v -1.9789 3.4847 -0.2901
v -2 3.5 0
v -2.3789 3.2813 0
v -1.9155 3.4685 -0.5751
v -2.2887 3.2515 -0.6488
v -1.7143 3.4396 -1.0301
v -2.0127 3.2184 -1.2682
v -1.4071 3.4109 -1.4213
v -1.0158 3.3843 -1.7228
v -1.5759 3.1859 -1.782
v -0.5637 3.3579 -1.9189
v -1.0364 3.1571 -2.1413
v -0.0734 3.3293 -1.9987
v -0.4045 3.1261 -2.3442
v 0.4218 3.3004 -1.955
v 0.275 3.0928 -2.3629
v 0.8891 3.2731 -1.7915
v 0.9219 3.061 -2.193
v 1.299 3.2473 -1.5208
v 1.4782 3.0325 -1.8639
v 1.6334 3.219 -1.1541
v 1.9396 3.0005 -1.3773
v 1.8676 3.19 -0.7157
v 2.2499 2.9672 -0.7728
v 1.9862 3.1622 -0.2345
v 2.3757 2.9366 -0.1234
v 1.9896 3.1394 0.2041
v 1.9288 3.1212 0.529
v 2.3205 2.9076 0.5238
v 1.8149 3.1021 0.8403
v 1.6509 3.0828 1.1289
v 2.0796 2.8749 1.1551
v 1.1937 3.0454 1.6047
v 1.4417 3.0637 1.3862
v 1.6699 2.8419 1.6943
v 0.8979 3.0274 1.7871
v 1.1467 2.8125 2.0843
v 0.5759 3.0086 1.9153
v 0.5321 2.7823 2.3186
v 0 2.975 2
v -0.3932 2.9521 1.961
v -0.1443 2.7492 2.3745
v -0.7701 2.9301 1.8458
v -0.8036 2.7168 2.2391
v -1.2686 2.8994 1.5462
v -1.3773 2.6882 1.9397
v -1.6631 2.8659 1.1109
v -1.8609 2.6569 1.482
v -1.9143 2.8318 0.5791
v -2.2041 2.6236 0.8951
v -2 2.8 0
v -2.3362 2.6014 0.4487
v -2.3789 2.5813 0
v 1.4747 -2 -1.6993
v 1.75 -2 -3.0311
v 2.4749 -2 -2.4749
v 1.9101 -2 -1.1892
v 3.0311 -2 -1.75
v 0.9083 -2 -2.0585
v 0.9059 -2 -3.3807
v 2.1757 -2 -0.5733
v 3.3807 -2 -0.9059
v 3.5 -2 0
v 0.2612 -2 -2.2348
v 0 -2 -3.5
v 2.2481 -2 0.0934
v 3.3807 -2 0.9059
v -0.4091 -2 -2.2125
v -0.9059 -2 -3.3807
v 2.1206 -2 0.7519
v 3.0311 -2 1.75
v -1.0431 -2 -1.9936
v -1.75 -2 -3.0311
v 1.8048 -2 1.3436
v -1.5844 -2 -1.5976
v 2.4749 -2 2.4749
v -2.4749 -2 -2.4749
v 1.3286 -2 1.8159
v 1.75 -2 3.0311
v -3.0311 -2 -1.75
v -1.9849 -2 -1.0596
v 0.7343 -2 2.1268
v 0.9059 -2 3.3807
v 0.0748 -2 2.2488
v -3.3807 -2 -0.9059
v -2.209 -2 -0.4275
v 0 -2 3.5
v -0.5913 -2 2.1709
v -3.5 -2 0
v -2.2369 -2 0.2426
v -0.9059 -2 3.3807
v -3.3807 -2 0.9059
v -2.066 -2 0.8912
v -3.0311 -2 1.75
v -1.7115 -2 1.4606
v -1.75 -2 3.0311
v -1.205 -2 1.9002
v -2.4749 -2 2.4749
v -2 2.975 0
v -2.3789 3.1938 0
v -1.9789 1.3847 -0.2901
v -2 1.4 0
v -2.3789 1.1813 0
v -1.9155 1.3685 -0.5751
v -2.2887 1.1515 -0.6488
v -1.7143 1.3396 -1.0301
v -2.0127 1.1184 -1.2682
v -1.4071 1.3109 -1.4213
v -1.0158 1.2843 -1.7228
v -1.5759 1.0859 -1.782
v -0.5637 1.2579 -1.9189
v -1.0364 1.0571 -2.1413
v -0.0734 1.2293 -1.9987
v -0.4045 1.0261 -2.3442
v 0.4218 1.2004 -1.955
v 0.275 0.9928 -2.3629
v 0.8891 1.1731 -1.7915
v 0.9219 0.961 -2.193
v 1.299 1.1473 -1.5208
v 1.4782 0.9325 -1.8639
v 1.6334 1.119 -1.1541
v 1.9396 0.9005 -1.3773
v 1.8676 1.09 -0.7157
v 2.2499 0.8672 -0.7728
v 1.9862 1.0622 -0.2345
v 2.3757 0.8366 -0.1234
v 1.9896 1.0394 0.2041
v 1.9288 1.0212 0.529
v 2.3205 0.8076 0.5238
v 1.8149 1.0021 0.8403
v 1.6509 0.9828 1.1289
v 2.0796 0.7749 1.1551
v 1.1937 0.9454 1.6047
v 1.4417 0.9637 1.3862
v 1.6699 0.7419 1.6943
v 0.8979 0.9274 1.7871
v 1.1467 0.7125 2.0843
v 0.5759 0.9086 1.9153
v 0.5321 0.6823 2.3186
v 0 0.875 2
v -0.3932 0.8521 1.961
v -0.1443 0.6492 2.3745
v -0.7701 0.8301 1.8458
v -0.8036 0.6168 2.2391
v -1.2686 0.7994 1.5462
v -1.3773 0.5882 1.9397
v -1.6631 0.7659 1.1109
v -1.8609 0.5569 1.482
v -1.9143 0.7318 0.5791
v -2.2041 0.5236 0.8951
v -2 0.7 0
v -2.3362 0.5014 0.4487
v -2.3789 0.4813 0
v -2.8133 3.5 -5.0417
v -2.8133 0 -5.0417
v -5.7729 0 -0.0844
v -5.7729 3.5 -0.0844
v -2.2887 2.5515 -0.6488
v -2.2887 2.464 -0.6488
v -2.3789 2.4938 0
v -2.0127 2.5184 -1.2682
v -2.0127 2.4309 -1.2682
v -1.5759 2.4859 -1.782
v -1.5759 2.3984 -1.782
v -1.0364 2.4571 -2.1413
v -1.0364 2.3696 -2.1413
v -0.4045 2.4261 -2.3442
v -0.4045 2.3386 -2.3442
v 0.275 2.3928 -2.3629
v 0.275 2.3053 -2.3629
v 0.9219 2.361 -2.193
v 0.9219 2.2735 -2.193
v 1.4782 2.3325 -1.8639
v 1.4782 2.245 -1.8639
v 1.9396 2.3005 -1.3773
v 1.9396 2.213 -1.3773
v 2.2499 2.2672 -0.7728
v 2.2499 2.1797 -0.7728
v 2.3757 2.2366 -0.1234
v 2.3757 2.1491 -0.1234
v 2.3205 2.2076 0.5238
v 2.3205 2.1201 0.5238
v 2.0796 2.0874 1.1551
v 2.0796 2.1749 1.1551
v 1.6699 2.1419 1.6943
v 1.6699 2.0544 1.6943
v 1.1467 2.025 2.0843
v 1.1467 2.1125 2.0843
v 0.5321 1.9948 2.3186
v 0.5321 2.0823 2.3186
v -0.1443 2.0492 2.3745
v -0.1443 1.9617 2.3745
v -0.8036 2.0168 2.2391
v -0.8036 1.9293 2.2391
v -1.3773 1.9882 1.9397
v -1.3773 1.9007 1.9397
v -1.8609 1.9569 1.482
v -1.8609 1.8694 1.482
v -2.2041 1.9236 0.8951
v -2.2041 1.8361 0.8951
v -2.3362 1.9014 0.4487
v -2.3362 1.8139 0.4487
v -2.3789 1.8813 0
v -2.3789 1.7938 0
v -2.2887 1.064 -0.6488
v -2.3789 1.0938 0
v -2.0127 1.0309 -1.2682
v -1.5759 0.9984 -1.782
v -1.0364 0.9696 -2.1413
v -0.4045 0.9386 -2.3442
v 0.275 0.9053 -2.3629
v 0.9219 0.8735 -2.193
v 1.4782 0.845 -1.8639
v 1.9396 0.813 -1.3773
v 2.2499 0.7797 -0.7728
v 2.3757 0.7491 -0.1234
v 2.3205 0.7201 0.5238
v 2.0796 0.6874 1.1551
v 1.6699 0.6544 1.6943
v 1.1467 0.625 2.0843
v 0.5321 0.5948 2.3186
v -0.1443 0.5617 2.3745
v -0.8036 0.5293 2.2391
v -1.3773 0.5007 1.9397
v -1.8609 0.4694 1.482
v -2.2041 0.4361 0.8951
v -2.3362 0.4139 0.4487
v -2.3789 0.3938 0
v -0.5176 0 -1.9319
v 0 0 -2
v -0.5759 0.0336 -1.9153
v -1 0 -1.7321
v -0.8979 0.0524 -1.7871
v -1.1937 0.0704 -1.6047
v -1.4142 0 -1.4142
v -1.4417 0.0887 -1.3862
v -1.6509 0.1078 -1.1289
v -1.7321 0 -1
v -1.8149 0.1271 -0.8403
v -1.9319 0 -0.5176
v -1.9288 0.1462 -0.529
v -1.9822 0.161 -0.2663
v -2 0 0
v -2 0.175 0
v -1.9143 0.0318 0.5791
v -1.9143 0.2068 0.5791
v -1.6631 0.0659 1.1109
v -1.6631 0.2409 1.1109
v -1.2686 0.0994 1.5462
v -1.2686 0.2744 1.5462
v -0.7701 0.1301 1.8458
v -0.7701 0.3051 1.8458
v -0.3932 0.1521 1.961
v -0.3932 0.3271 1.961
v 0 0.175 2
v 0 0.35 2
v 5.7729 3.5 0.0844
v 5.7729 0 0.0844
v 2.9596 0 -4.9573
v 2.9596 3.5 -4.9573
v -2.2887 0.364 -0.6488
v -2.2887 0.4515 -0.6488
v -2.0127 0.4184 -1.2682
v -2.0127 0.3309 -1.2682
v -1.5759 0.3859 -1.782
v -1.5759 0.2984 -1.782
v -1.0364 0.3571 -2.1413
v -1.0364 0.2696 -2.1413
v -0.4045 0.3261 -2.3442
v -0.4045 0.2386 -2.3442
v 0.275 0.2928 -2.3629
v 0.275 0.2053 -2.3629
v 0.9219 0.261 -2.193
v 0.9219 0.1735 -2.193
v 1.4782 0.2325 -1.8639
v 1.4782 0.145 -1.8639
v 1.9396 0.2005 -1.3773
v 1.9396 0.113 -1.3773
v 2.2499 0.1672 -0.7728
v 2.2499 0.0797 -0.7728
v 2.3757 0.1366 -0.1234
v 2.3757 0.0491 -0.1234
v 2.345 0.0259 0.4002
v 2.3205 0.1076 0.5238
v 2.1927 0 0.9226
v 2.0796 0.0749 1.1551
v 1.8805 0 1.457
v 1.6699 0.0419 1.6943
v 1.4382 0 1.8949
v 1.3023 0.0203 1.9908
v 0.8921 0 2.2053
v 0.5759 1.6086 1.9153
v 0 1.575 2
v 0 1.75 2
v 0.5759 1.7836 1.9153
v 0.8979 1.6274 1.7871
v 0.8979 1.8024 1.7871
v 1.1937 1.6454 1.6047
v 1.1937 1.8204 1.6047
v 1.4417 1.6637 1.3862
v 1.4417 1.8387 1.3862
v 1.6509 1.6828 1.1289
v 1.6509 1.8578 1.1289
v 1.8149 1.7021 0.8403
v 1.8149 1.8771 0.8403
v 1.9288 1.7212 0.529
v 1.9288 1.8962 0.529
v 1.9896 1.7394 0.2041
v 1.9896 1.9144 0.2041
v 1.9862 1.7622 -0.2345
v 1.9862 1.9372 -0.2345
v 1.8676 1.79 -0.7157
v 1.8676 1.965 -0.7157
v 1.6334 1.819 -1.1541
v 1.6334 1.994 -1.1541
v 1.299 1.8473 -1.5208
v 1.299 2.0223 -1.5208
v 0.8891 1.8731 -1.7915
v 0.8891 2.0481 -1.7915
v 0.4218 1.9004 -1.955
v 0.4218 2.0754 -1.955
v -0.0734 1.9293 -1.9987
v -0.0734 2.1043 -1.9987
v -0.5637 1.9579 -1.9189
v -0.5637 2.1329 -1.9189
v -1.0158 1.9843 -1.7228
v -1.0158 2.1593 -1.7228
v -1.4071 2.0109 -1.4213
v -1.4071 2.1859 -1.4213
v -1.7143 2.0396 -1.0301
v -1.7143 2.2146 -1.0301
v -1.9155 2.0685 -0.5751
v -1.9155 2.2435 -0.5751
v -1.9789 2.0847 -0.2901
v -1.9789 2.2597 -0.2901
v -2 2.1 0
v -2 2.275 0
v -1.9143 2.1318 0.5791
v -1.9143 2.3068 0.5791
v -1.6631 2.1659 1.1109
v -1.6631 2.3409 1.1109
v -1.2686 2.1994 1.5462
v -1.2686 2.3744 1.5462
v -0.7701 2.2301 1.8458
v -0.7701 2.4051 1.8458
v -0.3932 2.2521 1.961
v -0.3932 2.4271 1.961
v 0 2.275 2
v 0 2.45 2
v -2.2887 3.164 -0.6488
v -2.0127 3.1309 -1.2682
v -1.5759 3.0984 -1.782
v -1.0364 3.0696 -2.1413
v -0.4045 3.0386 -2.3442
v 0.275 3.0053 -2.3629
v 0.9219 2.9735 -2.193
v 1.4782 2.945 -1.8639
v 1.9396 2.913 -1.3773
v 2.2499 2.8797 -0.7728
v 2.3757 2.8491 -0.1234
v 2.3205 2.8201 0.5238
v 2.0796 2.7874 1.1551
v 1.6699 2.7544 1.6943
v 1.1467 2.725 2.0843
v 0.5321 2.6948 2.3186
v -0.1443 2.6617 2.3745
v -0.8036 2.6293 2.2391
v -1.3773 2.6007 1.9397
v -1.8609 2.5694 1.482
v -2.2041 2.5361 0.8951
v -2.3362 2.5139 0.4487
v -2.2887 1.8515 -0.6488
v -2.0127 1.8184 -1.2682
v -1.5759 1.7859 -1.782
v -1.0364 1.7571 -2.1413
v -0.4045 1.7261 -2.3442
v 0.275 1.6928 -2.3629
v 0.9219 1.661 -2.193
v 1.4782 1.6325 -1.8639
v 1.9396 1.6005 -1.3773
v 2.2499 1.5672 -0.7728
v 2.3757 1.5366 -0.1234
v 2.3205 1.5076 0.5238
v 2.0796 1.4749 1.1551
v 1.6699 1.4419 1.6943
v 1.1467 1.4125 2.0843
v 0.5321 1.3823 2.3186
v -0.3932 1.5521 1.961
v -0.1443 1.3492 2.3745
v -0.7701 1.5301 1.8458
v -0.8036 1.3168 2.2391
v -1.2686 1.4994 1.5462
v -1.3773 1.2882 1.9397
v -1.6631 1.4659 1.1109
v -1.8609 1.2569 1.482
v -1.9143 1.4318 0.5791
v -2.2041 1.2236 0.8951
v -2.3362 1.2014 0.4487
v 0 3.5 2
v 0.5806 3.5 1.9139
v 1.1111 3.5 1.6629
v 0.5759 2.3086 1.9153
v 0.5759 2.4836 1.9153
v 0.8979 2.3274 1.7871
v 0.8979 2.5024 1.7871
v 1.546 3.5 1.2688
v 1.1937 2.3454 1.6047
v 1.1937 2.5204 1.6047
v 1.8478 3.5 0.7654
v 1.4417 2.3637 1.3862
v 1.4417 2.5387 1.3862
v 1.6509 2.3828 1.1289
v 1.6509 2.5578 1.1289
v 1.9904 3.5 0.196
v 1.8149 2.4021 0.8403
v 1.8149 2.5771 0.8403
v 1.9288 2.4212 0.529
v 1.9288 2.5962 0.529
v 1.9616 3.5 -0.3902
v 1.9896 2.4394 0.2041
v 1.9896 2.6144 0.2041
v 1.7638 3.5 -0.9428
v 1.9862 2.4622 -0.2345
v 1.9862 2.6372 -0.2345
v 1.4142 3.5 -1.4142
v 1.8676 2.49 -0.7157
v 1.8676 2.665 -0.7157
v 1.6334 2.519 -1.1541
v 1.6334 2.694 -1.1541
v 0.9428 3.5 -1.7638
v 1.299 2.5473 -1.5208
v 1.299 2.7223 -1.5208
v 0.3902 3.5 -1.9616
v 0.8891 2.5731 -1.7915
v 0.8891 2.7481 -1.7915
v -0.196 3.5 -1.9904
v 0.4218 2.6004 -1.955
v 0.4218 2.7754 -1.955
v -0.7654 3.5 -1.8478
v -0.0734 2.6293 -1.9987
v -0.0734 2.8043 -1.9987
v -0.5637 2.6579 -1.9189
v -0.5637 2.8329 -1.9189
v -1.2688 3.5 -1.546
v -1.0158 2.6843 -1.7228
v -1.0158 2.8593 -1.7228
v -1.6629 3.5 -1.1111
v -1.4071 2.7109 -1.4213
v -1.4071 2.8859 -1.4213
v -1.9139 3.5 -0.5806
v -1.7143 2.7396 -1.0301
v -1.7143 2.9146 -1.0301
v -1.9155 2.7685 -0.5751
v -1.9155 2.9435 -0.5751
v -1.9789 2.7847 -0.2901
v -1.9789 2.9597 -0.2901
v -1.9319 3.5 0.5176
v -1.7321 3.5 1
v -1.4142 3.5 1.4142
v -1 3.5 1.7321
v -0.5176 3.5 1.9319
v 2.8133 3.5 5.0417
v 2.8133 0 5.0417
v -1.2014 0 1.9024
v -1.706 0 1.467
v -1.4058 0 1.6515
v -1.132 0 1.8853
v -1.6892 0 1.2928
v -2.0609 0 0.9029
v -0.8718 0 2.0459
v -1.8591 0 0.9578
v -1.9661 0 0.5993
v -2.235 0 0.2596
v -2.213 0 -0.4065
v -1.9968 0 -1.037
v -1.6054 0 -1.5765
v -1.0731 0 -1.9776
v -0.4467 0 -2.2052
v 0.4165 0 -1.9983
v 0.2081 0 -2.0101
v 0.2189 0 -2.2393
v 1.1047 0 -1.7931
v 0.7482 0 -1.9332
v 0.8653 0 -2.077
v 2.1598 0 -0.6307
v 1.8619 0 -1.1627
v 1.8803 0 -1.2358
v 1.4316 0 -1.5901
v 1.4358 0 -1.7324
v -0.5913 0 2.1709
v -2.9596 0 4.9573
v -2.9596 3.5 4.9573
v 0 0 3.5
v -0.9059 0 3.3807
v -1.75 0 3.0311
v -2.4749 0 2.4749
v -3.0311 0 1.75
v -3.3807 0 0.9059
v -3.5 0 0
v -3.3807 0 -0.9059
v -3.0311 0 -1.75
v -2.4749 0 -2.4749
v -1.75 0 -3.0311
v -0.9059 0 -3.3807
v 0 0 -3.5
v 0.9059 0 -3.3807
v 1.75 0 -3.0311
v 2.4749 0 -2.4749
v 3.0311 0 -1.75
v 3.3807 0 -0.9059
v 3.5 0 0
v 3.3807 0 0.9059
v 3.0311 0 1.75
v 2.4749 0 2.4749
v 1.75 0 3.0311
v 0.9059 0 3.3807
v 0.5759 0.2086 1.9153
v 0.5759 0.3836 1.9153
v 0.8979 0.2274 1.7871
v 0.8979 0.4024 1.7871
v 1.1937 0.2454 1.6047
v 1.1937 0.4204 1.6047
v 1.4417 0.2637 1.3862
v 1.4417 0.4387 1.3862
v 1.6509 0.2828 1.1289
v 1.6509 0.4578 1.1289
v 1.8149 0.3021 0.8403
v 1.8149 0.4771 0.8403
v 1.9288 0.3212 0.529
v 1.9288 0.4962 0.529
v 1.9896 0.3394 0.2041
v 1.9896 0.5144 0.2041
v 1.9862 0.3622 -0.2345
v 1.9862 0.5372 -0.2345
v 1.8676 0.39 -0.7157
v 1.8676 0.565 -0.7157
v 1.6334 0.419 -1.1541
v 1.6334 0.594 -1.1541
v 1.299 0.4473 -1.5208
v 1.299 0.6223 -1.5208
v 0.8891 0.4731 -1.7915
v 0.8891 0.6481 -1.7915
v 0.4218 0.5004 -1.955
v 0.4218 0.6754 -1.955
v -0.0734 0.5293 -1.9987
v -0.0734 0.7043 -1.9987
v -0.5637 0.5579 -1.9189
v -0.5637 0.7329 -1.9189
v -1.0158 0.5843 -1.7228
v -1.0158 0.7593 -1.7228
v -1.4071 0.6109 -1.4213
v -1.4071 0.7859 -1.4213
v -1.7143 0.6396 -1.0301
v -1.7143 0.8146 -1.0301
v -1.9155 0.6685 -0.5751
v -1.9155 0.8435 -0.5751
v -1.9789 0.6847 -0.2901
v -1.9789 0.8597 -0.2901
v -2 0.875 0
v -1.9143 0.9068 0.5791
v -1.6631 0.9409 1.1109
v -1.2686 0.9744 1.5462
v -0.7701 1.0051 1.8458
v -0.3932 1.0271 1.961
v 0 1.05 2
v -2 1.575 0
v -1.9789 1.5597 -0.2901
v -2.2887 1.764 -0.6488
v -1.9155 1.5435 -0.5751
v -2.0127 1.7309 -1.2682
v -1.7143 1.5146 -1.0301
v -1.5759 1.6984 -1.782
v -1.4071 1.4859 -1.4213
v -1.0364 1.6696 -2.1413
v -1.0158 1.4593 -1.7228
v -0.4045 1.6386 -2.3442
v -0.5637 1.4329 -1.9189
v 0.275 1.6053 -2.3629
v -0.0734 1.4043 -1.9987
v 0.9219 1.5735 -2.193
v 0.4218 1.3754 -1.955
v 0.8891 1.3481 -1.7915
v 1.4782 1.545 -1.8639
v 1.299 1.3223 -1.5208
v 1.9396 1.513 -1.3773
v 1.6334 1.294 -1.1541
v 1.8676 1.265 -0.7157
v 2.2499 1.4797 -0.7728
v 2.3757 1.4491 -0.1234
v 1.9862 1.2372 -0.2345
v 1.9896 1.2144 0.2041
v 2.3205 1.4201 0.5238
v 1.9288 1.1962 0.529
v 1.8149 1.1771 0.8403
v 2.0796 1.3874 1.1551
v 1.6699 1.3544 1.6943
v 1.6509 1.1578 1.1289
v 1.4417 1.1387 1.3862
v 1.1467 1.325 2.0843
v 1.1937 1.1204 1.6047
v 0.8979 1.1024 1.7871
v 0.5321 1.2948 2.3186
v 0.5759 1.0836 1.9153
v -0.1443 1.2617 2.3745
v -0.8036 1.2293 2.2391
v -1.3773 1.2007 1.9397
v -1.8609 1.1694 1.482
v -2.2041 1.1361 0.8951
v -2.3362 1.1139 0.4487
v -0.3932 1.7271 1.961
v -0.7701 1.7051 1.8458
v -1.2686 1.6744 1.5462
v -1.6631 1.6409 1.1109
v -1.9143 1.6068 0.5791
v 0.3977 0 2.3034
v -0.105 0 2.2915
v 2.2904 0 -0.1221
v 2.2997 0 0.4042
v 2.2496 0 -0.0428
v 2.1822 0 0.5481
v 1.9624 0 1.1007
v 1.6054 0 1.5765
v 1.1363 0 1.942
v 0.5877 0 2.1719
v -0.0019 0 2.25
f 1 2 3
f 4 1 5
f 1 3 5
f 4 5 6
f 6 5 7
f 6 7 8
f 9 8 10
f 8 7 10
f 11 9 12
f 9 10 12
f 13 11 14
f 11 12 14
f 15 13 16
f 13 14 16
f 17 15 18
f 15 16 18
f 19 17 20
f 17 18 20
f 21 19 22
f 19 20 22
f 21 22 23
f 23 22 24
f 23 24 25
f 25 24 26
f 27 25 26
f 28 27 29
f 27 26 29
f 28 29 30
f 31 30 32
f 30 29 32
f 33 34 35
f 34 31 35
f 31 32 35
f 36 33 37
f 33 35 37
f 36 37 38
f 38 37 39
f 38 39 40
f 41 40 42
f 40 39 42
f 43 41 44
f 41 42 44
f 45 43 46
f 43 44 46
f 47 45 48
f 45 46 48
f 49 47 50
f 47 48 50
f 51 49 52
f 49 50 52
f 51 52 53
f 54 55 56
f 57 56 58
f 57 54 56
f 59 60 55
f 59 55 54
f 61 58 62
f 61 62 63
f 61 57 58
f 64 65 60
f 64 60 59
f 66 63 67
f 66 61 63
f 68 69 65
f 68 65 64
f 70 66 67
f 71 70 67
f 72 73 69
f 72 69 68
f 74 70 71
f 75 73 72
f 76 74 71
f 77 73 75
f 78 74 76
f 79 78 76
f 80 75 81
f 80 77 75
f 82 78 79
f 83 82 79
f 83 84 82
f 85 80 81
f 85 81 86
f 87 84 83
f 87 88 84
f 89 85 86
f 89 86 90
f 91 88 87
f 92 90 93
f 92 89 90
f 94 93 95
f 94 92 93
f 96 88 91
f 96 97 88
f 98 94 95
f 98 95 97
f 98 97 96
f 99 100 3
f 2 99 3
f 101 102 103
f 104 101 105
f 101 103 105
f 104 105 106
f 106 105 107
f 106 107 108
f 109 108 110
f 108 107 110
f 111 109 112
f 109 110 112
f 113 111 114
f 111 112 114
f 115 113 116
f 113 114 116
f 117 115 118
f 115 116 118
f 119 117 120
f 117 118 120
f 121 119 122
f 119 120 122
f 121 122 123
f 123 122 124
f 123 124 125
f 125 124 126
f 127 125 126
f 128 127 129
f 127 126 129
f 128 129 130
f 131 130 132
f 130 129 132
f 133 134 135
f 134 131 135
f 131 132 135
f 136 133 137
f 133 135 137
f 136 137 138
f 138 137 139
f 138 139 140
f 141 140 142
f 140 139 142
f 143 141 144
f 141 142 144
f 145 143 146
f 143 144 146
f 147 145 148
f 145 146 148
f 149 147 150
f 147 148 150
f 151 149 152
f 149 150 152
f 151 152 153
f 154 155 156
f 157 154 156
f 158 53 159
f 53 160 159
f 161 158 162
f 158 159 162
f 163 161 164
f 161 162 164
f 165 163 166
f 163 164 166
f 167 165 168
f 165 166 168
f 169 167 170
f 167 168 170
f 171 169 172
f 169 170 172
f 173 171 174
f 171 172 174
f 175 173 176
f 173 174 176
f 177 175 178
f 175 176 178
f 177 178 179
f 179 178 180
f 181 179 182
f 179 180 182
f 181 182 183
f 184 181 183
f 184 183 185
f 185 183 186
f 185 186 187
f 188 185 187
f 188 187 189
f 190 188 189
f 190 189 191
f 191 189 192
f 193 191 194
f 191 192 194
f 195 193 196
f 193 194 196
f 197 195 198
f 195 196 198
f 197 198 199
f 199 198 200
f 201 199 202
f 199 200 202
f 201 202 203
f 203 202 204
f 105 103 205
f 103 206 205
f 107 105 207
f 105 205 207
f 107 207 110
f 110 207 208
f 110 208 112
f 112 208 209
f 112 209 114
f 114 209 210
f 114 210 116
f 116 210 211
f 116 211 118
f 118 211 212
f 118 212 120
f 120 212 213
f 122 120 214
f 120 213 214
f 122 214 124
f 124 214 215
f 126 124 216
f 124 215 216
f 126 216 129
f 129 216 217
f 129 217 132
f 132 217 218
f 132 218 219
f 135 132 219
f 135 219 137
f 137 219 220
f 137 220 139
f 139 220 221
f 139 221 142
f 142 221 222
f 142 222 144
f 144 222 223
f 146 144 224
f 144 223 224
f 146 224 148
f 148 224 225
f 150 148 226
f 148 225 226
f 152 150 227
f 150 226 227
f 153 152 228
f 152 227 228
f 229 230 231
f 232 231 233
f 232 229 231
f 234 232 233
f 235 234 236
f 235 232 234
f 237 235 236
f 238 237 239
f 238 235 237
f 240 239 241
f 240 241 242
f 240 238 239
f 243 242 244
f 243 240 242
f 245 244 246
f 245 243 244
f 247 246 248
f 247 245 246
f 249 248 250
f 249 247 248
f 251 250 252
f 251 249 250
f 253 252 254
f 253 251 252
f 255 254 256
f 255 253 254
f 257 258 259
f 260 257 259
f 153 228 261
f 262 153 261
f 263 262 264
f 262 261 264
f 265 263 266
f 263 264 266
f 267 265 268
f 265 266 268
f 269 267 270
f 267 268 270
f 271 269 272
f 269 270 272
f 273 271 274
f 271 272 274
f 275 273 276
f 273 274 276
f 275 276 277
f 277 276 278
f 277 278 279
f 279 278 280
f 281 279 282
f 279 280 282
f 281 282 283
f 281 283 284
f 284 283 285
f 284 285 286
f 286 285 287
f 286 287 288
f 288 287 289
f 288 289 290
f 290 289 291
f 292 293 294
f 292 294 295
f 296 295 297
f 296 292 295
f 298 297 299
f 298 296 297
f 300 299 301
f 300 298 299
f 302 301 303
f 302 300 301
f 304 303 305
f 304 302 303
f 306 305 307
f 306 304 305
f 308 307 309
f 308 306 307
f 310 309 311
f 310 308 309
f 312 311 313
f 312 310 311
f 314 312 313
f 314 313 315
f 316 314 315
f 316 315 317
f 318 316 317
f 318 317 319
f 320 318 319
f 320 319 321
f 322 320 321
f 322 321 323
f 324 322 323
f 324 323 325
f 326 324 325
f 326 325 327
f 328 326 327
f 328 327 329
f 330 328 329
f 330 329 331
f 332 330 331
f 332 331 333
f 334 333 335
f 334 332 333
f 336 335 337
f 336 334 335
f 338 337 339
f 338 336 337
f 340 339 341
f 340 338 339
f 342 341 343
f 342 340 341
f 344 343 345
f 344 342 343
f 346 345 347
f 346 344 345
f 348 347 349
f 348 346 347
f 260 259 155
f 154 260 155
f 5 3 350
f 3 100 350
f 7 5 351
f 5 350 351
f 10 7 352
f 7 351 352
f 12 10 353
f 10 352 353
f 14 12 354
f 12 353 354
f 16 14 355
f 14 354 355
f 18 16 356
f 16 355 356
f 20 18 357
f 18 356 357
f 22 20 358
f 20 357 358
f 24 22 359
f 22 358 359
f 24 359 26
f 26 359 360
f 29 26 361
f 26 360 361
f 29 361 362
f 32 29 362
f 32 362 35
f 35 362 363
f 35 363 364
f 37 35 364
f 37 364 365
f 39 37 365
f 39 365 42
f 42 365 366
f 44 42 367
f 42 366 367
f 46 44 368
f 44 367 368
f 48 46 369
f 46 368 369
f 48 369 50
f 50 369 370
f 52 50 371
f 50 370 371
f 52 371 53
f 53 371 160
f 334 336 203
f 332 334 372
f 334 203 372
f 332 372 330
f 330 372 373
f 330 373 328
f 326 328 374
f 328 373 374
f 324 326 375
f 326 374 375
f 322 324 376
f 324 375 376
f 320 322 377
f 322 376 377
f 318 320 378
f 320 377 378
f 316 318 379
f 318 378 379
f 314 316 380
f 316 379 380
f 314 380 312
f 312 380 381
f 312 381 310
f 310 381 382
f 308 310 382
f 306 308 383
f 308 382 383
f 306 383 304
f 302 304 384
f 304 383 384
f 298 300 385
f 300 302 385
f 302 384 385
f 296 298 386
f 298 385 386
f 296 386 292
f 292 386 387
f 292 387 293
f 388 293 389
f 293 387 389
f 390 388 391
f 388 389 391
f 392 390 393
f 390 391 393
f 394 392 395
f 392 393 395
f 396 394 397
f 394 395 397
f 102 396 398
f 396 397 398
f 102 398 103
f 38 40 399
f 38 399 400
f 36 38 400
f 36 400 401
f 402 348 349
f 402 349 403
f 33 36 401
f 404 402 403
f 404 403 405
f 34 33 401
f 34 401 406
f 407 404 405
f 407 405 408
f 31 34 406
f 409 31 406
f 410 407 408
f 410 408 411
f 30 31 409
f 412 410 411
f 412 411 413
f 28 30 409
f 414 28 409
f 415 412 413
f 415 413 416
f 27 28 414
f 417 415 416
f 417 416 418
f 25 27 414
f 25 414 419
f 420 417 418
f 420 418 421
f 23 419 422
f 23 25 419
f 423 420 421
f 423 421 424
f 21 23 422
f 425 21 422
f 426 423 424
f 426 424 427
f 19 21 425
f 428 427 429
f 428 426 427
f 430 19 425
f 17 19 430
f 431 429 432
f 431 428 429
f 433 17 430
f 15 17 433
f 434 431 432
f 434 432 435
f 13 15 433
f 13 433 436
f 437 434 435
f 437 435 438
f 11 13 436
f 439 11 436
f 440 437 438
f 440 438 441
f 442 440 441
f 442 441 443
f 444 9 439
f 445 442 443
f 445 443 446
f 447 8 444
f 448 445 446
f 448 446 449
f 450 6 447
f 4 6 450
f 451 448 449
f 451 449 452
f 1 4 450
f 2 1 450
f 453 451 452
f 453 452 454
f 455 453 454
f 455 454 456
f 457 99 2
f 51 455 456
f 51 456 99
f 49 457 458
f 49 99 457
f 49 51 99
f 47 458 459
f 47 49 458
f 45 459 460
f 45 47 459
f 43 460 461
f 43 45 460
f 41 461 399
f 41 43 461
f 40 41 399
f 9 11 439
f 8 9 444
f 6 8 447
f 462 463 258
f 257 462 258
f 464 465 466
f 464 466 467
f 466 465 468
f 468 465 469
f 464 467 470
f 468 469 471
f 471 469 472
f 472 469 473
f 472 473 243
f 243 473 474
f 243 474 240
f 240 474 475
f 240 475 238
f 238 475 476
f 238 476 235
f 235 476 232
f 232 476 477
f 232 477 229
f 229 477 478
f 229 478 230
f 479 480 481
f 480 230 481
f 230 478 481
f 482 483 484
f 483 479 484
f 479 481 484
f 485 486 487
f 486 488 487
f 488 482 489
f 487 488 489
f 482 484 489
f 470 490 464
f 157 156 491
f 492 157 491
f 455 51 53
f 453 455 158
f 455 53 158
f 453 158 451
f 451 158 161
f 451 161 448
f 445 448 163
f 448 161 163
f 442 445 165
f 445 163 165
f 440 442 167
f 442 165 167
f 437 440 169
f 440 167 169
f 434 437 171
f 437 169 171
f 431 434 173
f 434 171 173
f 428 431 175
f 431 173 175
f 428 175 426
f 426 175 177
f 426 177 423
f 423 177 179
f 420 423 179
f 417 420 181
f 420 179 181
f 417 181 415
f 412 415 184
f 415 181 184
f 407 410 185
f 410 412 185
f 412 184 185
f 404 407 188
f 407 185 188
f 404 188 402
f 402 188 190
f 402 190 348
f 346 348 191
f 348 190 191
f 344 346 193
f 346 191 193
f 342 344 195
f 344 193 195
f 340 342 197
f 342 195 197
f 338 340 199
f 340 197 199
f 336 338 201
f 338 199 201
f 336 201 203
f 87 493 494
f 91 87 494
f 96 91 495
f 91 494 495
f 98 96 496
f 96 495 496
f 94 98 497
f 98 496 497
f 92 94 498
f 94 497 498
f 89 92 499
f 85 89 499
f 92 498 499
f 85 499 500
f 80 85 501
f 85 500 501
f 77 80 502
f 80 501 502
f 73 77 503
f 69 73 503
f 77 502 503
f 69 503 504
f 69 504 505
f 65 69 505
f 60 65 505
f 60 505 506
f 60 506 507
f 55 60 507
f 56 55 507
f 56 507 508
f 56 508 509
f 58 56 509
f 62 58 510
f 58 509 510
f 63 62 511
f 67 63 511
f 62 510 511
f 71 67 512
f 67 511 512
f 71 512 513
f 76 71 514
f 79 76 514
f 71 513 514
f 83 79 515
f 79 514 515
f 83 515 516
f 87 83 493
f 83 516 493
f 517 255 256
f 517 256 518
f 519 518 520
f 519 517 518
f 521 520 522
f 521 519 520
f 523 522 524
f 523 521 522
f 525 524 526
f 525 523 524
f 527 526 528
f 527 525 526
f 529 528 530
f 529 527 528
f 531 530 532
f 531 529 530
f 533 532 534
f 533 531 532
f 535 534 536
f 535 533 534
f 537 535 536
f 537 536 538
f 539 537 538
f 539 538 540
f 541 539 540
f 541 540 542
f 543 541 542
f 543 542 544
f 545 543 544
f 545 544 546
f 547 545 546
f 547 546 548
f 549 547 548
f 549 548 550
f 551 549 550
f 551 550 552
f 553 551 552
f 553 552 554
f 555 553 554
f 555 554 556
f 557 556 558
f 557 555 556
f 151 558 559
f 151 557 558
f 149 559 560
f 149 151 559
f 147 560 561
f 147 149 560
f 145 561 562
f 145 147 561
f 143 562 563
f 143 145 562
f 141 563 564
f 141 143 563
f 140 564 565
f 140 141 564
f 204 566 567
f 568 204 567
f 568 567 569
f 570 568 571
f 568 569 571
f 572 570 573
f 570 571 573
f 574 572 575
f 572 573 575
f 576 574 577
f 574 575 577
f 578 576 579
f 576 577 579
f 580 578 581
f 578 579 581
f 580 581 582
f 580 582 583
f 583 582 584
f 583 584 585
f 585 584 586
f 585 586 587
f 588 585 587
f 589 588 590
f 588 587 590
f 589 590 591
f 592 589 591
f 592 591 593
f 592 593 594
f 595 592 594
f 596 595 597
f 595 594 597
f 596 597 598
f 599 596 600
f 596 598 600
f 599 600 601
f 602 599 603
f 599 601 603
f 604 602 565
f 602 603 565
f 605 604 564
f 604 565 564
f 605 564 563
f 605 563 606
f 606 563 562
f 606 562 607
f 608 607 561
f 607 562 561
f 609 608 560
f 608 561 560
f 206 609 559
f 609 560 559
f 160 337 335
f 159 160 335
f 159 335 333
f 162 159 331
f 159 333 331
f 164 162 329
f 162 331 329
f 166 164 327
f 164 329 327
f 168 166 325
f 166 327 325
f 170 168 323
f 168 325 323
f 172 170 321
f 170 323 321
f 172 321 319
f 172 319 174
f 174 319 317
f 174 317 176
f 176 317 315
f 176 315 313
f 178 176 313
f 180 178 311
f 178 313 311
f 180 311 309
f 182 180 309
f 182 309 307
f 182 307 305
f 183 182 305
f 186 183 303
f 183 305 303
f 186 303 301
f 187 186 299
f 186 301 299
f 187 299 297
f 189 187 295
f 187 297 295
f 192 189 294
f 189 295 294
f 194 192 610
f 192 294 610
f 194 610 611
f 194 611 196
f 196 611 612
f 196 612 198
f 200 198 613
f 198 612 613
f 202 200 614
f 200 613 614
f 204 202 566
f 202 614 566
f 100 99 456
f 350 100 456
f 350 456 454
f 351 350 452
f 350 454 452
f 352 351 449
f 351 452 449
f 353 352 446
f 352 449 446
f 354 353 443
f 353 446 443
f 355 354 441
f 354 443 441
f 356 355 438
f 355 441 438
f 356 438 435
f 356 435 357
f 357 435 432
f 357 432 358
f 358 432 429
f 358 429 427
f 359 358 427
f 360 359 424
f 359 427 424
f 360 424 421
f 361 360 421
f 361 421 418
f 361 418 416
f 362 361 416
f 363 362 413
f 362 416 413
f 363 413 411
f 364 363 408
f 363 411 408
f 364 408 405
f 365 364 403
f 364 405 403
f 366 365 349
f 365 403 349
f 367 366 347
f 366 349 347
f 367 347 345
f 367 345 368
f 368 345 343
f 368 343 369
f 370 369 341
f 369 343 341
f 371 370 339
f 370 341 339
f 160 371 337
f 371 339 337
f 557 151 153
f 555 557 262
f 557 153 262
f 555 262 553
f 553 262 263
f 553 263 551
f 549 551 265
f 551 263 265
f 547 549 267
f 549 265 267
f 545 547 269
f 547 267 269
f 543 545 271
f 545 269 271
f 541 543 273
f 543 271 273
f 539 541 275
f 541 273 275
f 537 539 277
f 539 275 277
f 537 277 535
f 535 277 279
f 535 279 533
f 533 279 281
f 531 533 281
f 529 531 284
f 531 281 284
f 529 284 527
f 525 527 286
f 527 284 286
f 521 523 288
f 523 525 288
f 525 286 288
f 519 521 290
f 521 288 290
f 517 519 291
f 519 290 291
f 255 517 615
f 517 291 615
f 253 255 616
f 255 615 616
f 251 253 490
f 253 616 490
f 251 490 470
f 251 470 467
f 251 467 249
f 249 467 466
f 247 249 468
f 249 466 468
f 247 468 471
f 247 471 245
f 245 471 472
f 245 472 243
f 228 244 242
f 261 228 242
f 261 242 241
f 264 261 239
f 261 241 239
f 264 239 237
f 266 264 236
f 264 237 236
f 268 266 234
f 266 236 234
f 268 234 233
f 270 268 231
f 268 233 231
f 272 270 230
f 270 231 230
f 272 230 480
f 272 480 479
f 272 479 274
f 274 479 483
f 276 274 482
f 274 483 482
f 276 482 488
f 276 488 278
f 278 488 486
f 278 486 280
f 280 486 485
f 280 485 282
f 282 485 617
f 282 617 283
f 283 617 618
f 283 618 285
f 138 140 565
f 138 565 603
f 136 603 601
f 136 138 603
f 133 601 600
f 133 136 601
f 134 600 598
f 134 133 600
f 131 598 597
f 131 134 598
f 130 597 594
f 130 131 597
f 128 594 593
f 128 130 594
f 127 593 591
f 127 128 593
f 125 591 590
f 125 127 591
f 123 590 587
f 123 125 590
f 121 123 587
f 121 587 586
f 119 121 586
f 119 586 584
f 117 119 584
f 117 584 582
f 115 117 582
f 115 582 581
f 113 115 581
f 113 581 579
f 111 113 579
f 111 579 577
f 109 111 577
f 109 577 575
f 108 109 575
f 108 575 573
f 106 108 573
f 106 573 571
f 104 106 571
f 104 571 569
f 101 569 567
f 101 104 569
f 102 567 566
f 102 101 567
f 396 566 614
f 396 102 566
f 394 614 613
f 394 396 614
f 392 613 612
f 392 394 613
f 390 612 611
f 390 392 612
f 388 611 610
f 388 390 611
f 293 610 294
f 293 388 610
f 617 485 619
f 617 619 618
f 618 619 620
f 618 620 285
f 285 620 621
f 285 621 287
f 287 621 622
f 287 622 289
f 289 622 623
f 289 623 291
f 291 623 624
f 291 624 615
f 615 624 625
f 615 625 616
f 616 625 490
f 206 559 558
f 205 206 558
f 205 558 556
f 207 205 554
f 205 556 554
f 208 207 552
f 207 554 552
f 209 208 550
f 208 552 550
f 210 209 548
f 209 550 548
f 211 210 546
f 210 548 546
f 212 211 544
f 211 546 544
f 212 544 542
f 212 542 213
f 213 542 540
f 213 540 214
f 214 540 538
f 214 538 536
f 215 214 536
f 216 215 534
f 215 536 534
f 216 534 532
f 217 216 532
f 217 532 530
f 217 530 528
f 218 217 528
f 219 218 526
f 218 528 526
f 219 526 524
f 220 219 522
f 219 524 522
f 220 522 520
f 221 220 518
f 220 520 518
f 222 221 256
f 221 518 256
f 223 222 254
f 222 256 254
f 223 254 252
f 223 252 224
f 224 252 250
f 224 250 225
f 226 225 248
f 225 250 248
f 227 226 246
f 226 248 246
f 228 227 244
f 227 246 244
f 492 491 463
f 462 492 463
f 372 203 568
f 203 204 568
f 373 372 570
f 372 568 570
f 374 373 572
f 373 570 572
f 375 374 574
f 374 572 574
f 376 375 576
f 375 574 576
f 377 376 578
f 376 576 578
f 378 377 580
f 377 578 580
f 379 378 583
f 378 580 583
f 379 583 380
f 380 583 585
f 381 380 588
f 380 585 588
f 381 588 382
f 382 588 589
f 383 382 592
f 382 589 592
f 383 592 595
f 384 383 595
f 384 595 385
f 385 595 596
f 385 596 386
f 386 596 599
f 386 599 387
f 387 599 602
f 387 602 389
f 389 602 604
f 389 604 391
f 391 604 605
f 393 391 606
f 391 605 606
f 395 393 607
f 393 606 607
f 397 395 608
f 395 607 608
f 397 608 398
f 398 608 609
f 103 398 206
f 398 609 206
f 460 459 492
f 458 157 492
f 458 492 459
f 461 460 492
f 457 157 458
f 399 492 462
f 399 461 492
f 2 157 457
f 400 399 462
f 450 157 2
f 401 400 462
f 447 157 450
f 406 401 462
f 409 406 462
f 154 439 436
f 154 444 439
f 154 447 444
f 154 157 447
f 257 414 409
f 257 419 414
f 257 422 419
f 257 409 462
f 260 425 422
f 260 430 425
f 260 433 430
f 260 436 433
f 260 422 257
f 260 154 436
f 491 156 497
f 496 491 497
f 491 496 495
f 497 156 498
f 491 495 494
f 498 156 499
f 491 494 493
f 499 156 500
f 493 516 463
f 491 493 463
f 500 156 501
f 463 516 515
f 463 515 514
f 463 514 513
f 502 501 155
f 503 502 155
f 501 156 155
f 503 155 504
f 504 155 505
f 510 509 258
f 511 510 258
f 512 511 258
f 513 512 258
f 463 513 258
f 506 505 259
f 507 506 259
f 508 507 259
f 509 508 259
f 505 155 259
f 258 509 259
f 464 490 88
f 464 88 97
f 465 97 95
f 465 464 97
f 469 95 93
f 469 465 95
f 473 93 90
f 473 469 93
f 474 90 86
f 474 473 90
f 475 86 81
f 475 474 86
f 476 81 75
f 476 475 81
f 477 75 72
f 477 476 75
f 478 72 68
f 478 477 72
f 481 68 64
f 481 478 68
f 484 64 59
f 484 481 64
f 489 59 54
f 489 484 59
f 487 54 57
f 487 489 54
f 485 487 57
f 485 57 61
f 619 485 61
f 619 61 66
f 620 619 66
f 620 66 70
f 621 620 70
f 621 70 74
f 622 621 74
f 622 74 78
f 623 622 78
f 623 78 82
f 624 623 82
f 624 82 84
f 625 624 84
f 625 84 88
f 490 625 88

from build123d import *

# Parameters (mm, degrees)
CROQUIS1_R              = 2
SALIENTE_EXTRUIR1_DEPTH = 3.5
ROSCA1_PITCH            = 0.7
CROQUIS2_R              = 3.5
CROQUIS2_R_2            = 2.25
SALIENTE_EXTRUIR2_DEPTH = 2


with BuildPart() as part:
    # Croquis1 → Saliente-Extruir1 (new body)
    with BuildSketch(Plane(origin=(0, 0, 0), x_dir=(1, 0, 0), z_dir=(0, 1, 0))):
        Polygon((2.959554739, 4.957254188), (-2.81333069, 5.041676682), (-5.772885429, 0.084422494), (-2.959554739, -4.957254188), (2.81333069, -5.041676682), (5.772885429, -0.084422494), align=None)
        with Locations(Location((0, 0, 0), (0, 0, 270))):
            Circle(CROQUIS1_R, mode=Mode.SUBTRACT)
    extrude(amount=SALIENTE_EXTRUIR1_DEPTH)

    # Rosca1: the profile of Perfil de rosca1 profile screwed along a right-hand helix of 5 turns, 6 arcs to a turn; built about Z, then put on its axis
    rosca1_z = Axis((0, 0, 0), (0, 0, 1))
    rosca1_corners = [(1.9997, 0, -0.000173205), (2.378886113, 0, 0.218749999), (2.378886113, 0, 0.306249999), (1.9997, 0, 0.525173203)]
    with BuildLine(mode=Mode.PRIVATE) as rosca1_profile:
        Line(rosca1_corners[0], rosca1_corners[1])
        Line(rosca1_corners[1], rosca1_corners[2])
        Line(rosca1_corners[2], rosca1_corners[3])
        Line(rosca1_corners[3], rosca1_corners[0])
    rosca1_cap = Face(rosca1_profile.wire())
    rosca1_turn_angles = [0, 30, 60, 90, 120, 150, 180, 210, 240, 270, 300, 330, 360]
    rosca1_turn_weights = [1, 0.8660254037844387, 1, 0.8660254037844387, 1, 0.8660254037844387, 1, 0.8660254037844387, 1, 0.8660254037844387, 1, 0.8660254037844387, 1]
    rosca1_turn_rails = [Edge.make_bspline([Vector(p[0], p[1], 0).rotate(rosca1_z, rosca1_turn_angles[k]) / rosca1_turn_weights[k] + Vector(0, 0, p[2] + ROSCA1_PITCH * rosca1_turn_angles[k] / 360) for k in range(13)], [0, 0, 0, 1, 1, 2, 2, 3, 3, 4, 4, 5, 5, 6, 6, 6], 2, rosca1_turn_weights) for p in rosca1_corners]
    rosca1_turn_sides = [Face.make_surface_from_curves(rosca1_turn_rails[p[0]], rosca1_turn_rails[p[1]]) for p in [(0, 1), (1, 2), (2, 3), (3, 0)]]
    rosca1 = Plane(origin=(0, 3.5, 0), x_dir=(-1, 0, 0), z_dir=(0, -1, 0)) * Solid(Shell([*[p.moved(Location((0, 0, ROSCA1_PITCH * i))) for i in range(5) for p in rosca1_turn_sides], rosca1_cap, rosca1_cap.rotate(rosca1_z, 1800).moved(Location((0, 0, ROSCA1_PITCH * 1800 / 360)))]))
    add(rosca1, mode=Mode.SUBTRACT)

    # Croquis2 → Saliente-Extruir2 (add)
    with BuildSketch(Plane.XZ):
        with Locations(Location((0, 0, 0), (0, 0, 90))):
            Circle(CROQUIS2_R)
        with Locations(Location((0, 0, 0), (0, 0, 105.23750757))):
            Circle(CROQUIS2_R_2, mode=Mode.SUBTRACT)
    extrude(amount=SALIENTE_EXTRUIR2_DEPTH)


solid = part.part
